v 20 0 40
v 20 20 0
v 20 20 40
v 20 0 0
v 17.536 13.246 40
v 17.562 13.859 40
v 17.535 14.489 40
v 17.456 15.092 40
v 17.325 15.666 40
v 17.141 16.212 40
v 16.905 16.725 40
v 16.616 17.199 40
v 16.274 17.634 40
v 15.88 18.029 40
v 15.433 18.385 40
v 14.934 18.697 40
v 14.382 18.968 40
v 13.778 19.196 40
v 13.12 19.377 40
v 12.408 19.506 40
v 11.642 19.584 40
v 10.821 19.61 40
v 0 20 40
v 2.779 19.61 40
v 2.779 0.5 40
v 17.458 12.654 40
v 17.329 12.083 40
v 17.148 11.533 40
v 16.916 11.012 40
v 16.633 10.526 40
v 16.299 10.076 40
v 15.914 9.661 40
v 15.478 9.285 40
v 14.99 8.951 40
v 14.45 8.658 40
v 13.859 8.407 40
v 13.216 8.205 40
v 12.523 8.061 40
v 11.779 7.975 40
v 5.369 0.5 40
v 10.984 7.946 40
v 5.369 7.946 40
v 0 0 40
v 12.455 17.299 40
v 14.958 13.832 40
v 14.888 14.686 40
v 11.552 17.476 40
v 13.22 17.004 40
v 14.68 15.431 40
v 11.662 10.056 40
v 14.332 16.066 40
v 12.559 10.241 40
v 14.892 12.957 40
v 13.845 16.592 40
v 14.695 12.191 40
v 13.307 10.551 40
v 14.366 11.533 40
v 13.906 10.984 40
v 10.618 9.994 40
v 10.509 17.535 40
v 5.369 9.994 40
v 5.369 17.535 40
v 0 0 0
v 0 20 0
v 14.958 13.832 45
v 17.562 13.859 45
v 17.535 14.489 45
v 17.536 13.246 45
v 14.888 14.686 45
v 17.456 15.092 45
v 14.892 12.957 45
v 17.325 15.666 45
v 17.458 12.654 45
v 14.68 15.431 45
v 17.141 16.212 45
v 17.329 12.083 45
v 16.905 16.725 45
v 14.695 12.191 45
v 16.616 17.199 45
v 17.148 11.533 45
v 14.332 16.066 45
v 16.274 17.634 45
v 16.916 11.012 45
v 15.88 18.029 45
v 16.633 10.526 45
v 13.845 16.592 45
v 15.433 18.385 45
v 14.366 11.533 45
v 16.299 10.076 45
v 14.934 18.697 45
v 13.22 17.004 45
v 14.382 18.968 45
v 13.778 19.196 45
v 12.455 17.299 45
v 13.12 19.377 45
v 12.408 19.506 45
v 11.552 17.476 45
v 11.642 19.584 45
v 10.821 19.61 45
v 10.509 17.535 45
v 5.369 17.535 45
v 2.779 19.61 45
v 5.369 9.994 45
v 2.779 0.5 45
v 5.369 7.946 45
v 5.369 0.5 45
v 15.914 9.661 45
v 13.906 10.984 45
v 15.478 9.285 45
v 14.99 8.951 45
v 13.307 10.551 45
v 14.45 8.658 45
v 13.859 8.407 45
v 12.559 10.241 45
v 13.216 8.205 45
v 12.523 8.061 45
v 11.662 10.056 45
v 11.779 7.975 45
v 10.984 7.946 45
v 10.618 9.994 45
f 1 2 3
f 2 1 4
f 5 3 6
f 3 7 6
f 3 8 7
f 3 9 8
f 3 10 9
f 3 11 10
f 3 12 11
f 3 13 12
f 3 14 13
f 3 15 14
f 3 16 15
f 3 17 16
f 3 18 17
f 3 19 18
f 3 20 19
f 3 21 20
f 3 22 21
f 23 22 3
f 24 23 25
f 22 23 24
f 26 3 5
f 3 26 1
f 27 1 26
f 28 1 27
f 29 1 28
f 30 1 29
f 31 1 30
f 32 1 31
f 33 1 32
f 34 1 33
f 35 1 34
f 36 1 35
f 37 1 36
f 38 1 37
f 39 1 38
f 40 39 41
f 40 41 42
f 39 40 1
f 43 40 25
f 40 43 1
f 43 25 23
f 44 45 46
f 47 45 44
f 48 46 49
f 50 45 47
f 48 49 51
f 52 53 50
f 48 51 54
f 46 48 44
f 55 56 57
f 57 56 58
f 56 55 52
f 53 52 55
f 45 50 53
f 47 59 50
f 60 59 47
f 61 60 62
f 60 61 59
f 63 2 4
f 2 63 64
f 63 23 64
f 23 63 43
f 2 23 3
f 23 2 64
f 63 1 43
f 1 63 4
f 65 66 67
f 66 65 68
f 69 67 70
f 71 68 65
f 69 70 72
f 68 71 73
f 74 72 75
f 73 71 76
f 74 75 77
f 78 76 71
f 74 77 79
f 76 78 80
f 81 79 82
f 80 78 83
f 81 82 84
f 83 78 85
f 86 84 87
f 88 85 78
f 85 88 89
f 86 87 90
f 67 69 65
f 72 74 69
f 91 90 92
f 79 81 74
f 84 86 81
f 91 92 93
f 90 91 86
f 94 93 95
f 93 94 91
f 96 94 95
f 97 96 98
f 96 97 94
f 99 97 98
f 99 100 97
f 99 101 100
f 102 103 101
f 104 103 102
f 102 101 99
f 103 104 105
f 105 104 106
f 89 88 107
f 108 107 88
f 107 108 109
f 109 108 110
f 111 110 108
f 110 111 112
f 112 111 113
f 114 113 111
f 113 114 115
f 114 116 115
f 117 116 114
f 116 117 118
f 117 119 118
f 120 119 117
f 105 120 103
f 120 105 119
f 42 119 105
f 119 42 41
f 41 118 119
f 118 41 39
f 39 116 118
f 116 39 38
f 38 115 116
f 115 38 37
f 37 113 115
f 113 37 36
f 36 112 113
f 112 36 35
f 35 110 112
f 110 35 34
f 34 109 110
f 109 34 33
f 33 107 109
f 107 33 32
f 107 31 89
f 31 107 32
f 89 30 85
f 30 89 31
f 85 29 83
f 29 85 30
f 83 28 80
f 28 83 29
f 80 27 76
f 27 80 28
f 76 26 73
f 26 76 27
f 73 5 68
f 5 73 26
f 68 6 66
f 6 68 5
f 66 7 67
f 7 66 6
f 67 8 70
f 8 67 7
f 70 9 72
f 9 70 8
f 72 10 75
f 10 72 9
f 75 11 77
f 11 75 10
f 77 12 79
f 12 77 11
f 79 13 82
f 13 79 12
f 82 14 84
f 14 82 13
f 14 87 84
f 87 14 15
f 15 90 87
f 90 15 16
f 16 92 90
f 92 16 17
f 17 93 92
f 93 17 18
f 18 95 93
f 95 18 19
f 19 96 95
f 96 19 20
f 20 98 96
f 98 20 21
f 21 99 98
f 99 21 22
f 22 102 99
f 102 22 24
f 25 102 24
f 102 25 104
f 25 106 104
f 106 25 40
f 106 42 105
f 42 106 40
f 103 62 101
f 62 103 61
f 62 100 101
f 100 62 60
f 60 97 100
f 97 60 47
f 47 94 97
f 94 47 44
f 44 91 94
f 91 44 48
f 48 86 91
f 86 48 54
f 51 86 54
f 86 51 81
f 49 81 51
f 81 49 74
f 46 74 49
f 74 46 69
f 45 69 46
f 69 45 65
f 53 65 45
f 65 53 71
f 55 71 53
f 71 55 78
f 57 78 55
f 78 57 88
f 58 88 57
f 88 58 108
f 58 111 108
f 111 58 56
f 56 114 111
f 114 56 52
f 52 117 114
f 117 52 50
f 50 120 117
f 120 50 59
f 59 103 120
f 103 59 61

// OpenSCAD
cube([20, 20, 40]);
translate([0.5, 0.5, 40]){
    linear_extrude(5){
        text("P", size=20);
    }
}
